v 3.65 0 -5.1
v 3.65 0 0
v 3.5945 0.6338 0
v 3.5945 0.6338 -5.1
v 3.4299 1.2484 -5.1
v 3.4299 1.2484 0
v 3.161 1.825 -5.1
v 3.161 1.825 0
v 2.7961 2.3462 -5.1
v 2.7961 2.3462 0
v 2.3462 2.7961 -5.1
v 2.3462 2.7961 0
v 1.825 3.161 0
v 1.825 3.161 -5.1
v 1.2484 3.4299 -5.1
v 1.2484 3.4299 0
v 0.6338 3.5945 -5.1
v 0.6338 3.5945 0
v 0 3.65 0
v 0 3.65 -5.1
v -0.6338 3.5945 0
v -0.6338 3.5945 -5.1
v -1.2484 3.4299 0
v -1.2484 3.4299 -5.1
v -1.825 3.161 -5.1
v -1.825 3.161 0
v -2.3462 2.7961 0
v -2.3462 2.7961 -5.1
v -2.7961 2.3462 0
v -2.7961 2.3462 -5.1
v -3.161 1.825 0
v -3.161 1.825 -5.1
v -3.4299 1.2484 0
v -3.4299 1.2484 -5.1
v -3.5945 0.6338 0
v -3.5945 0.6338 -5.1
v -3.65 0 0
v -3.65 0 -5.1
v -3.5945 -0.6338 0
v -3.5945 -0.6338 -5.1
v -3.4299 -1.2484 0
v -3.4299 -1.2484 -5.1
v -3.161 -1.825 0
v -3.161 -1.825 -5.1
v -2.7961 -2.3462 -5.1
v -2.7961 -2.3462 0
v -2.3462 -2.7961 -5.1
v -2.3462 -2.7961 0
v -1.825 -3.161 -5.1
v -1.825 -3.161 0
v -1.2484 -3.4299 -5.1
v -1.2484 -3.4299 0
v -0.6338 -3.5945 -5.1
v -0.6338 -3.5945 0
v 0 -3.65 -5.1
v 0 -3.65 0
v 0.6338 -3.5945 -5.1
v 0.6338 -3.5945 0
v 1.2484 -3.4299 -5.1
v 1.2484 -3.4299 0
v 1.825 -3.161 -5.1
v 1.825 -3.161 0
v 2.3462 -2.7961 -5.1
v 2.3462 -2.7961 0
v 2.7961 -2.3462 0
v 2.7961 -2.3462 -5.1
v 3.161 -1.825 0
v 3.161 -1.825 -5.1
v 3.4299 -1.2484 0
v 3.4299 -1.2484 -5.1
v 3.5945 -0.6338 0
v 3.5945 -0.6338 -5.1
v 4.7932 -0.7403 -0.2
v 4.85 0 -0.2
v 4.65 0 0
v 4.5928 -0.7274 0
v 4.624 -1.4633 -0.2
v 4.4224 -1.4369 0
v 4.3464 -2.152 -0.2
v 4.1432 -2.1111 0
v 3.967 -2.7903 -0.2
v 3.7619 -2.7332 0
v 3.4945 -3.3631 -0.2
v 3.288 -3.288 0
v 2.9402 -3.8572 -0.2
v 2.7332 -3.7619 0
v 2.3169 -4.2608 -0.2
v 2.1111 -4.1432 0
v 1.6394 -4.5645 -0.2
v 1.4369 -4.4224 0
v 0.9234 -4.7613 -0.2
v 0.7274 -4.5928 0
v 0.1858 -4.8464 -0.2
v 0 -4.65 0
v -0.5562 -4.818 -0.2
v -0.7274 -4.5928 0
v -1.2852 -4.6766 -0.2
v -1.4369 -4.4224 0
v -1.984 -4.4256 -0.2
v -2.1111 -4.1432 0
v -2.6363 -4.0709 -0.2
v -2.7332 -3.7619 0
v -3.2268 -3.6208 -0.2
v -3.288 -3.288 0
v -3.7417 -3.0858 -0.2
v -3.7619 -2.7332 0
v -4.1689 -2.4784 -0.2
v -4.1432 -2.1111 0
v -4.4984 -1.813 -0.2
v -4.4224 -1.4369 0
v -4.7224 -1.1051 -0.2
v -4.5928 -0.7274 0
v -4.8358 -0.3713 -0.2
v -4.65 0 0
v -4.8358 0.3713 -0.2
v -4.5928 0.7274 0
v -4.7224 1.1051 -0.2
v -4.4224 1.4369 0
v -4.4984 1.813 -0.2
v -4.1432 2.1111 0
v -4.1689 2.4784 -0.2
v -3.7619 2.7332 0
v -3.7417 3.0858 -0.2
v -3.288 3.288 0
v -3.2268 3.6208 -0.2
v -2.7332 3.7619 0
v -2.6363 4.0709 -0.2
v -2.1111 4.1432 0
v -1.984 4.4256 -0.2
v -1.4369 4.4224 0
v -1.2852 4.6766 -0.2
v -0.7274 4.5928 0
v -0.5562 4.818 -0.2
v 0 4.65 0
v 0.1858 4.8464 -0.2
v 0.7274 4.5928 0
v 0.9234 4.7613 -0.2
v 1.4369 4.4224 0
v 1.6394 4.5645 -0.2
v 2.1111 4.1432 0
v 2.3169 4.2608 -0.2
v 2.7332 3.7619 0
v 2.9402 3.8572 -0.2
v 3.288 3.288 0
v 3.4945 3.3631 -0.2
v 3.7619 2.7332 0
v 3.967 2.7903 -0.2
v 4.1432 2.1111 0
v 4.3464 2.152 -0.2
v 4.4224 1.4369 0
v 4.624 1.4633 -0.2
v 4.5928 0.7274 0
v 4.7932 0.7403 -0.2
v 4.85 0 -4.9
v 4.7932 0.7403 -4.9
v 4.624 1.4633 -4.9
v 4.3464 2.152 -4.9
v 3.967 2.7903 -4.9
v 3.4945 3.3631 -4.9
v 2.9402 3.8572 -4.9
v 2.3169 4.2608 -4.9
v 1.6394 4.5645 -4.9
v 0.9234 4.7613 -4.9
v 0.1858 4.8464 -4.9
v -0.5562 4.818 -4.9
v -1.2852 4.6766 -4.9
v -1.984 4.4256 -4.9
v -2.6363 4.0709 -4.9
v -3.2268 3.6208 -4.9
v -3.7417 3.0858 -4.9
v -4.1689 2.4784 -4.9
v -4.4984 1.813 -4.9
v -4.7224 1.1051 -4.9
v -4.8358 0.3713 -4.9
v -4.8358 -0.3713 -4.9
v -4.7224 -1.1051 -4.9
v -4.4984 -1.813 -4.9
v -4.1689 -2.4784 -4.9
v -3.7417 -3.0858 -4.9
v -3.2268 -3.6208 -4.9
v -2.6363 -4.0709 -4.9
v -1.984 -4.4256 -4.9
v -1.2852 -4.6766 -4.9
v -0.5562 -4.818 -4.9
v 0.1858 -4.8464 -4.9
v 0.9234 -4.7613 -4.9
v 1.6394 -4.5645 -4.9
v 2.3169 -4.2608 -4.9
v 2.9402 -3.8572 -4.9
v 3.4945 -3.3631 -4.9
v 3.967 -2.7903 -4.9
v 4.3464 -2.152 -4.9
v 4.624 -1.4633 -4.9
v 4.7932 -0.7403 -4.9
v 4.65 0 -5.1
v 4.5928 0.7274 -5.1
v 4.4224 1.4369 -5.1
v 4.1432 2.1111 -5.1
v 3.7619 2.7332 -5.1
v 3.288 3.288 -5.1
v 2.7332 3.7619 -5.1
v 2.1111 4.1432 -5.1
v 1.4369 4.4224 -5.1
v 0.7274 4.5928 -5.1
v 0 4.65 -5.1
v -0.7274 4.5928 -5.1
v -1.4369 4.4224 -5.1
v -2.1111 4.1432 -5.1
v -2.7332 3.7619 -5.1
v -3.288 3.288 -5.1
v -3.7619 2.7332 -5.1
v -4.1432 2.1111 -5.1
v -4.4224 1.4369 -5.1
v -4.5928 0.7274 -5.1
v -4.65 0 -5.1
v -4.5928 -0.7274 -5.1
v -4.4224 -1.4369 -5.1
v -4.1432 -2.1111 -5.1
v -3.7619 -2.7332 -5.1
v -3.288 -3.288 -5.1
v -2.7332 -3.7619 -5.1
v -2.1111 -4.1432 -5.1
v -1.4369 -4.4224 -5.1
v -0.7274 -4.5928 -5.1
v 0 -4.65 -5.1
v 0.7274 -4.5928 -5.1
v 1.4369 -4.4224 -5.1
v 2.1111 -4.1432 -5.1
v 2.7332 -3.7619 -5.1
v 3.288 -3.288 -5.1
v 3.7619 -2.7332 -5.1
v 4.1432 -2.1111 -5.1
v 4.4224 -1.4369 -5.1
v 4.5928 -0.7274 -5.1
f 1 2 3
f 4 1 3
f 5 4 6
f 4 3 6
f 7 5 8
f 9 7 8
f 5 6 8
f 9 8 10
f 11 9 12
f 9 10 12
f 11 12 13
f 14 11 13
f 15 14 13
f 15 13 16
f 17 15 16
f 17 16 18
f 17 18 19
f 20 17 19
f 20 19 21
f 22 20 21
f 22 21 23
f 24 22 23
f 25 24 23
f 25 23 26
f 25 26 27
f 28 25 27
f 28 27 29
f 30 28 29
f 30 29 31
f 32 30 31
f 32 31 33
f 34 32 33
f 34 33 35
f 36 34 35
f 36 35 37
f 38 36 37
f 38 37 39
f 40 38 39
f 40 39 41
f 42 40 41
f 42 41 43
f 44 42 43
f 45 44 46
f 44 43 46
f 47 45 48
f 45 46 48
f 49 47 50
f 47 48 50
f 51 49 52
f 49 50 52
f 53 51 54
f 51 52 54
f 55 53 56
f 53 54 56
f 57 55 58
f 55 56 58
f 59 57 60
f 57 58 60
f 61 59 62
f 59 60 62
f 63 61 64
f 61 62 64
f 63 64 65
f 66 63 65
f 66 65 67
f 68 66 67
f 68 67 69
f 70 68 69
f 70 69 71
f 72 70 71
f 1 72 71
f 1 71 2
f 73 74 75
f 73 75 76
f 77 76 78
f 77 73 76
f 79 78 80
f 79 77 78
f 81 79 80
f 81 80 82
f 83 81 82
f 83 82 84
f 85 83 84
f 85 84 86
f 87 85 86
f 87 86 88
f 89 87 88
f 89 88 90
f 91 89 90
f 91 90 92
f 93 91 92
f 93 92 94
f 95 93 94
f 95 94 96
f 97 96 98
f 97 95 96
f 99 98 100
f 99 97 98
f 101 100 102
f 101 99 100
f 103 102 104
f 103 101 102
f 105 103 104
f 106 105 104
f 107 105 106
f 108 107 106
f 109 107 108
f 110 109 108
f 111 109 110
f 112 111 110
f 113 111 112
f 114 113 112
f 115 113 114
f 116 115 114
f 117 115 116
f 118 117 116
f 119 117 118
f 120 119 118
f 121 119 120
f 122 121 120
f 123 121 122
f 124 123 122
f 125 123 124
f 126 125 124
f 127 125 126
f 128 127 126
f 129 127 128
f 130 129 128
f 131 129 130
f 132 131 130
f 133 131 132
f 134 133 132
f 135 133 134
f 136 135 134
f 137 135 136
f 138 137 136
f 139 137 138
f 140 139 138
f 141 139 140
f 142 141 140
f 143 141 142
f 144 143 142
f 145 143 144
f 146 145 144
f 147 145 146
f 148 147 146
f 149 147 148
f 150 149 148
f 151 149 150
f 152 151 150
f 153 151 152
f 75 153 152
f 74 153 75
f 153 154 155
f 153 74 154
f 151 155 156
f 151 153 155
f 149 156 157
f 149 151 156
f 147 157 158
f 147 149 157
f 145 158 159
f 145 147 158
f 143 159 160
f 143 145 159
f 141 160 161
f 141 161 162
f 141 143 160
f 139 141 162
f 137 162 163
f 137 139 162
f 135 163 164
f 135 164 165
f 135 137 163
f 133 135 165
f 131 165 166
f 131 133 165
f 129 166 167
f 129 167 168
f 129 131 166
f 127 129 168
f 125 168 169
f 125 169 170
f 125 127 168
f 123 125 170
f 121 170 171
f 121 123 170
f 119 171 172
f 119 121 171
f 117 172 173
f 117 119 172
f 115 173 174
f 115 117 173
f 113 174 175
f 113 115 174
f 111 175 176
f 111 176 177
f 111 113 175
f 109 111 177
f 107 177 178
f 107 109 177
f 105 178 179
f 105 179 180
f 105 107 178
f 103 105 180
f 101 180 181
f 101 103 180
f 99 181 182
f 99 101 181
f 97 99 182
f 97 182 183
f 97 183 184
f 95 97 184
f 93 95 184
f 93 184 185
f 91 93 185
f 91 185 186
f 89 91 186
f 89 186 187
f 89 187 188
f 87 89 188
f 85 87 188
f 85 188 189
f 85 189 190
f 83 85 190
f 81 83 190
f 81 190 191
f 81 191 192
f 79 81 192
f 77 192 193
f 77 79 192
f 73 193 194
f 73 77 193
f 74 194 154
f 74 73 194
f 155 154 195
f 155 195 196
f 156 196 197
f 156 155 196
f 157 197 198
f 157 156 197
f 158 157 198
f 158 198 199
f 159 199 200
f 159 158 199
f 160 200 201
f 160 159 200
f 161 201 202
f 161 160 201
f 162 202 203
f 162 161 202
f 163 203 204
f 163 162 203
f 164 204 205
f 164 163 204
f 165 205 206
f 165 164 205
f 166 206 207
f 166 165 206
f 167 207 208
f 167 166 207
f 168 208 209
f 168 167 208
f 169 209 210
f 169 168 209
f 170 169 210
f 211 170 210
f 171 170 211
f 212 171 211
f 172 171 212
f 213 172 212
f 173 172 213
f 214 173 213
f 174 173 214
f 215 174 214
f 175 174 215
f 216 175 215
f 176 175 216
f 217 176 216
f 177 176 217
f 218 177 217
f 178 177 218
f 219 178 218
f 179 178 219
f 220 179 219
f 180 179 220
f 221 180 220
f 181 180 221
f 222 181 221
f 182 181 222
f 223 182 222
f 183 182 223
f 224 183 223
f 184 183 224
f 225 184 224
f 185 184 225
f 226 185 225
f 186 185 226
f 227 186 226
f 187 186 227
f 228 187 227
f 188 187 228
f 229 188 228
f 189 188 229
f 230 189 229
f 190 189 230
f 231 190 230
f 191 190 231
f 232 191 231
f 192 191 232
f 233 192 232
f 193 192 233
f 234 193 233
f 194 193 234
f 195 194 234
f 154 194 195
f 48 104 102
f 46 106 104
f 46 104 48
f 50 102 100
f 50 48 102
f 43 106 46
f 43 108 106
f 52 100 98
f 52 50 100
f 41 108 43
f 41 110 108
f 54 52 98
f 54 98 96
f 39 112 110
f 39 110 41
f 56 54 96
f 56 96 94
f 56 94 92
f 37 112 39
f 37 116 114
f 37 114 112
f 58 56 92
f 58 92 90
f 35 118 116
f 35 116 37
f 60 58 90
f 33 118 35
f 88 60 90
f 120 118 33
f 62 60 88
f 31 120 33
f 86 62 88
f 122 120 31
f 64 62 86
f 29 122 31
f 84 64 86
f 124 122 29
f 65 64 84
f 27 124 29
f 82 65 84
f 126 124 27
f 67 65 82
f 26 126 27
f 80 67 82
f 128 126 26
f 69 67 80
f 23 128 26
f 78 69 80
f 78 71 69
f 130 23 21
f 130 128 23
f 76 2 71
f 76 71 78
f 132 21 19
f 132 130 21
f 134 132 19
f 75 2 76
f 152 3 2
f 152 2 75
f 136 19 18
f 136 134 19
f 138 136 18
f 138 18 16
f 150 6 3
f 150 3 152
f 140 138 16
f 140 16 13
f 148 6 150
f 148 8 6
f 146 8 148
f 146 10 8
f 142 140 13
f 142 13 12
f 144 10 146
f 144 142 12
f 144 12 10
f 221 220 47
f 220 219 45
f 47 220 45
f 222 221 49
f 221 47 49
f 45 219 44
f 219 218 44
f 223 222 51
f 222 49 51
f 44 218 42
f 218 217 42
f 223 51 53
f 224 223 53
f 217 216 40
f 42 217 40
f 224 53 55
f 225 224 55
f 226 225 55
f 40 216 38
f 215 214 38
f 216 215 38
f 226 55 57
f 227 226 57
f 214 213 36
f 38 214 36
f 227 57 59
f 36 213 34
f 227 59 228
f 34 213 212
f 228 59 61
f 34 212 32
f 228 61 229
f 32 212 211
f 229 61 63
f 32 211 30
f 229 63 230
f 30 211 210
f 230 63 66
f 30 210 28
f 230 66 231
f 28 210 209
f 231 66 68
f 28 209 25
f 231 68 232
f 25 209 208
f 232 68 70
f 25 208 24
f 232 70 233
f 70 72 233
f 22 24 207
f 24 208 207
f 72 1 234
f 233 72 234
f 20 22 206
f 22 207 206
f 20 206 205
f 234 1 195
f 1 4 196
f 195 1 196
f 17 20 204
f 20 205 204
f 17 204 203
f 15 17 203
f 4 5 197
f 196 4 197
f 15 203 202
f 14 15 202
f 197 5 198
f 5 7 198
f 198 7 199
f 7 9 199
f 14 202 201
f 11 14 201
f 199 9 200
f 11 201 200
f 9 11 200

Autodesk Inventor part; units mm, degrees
ref_plane "YZ Plane" through (0, 0, 0) normal (1, 0, 0) x (0, 1, 0)
ref_plane "XZ Plane" through (0, 0, 0) normal (0, 1, 0) x (-1, 0, 0)
ref_plane "XY Plane" through (0, 0, 0) normal (0, 0, 1) x (1, 0, 0)
sketch "Sketch1" plane through (0, 0, 0) normal (0, 0, 1) x (1, 0, 0)
  circle A0 centre (0, 0) radius 4.85
  dimension "d0" = 9.7
extrude "Extrusion1" add sketch "Sketch1" against normal blind 5.1
sketch "Sketch2" plane through (0, 0, 0) normal (0, 0, 1) x (1, 0, 0)
  circle A0 centre (0, 0) radius 3.65
  dimension "d3" = 7.3
extrude "Extrusion2" cut sketch "Sketch2" against normal through all
chamfer "Chamfer1" distance 0.2 angle 45 2 edges at (-4.85, 0, 0) (-4.85, 0, -5.1)
properties part number "cap_bot"
